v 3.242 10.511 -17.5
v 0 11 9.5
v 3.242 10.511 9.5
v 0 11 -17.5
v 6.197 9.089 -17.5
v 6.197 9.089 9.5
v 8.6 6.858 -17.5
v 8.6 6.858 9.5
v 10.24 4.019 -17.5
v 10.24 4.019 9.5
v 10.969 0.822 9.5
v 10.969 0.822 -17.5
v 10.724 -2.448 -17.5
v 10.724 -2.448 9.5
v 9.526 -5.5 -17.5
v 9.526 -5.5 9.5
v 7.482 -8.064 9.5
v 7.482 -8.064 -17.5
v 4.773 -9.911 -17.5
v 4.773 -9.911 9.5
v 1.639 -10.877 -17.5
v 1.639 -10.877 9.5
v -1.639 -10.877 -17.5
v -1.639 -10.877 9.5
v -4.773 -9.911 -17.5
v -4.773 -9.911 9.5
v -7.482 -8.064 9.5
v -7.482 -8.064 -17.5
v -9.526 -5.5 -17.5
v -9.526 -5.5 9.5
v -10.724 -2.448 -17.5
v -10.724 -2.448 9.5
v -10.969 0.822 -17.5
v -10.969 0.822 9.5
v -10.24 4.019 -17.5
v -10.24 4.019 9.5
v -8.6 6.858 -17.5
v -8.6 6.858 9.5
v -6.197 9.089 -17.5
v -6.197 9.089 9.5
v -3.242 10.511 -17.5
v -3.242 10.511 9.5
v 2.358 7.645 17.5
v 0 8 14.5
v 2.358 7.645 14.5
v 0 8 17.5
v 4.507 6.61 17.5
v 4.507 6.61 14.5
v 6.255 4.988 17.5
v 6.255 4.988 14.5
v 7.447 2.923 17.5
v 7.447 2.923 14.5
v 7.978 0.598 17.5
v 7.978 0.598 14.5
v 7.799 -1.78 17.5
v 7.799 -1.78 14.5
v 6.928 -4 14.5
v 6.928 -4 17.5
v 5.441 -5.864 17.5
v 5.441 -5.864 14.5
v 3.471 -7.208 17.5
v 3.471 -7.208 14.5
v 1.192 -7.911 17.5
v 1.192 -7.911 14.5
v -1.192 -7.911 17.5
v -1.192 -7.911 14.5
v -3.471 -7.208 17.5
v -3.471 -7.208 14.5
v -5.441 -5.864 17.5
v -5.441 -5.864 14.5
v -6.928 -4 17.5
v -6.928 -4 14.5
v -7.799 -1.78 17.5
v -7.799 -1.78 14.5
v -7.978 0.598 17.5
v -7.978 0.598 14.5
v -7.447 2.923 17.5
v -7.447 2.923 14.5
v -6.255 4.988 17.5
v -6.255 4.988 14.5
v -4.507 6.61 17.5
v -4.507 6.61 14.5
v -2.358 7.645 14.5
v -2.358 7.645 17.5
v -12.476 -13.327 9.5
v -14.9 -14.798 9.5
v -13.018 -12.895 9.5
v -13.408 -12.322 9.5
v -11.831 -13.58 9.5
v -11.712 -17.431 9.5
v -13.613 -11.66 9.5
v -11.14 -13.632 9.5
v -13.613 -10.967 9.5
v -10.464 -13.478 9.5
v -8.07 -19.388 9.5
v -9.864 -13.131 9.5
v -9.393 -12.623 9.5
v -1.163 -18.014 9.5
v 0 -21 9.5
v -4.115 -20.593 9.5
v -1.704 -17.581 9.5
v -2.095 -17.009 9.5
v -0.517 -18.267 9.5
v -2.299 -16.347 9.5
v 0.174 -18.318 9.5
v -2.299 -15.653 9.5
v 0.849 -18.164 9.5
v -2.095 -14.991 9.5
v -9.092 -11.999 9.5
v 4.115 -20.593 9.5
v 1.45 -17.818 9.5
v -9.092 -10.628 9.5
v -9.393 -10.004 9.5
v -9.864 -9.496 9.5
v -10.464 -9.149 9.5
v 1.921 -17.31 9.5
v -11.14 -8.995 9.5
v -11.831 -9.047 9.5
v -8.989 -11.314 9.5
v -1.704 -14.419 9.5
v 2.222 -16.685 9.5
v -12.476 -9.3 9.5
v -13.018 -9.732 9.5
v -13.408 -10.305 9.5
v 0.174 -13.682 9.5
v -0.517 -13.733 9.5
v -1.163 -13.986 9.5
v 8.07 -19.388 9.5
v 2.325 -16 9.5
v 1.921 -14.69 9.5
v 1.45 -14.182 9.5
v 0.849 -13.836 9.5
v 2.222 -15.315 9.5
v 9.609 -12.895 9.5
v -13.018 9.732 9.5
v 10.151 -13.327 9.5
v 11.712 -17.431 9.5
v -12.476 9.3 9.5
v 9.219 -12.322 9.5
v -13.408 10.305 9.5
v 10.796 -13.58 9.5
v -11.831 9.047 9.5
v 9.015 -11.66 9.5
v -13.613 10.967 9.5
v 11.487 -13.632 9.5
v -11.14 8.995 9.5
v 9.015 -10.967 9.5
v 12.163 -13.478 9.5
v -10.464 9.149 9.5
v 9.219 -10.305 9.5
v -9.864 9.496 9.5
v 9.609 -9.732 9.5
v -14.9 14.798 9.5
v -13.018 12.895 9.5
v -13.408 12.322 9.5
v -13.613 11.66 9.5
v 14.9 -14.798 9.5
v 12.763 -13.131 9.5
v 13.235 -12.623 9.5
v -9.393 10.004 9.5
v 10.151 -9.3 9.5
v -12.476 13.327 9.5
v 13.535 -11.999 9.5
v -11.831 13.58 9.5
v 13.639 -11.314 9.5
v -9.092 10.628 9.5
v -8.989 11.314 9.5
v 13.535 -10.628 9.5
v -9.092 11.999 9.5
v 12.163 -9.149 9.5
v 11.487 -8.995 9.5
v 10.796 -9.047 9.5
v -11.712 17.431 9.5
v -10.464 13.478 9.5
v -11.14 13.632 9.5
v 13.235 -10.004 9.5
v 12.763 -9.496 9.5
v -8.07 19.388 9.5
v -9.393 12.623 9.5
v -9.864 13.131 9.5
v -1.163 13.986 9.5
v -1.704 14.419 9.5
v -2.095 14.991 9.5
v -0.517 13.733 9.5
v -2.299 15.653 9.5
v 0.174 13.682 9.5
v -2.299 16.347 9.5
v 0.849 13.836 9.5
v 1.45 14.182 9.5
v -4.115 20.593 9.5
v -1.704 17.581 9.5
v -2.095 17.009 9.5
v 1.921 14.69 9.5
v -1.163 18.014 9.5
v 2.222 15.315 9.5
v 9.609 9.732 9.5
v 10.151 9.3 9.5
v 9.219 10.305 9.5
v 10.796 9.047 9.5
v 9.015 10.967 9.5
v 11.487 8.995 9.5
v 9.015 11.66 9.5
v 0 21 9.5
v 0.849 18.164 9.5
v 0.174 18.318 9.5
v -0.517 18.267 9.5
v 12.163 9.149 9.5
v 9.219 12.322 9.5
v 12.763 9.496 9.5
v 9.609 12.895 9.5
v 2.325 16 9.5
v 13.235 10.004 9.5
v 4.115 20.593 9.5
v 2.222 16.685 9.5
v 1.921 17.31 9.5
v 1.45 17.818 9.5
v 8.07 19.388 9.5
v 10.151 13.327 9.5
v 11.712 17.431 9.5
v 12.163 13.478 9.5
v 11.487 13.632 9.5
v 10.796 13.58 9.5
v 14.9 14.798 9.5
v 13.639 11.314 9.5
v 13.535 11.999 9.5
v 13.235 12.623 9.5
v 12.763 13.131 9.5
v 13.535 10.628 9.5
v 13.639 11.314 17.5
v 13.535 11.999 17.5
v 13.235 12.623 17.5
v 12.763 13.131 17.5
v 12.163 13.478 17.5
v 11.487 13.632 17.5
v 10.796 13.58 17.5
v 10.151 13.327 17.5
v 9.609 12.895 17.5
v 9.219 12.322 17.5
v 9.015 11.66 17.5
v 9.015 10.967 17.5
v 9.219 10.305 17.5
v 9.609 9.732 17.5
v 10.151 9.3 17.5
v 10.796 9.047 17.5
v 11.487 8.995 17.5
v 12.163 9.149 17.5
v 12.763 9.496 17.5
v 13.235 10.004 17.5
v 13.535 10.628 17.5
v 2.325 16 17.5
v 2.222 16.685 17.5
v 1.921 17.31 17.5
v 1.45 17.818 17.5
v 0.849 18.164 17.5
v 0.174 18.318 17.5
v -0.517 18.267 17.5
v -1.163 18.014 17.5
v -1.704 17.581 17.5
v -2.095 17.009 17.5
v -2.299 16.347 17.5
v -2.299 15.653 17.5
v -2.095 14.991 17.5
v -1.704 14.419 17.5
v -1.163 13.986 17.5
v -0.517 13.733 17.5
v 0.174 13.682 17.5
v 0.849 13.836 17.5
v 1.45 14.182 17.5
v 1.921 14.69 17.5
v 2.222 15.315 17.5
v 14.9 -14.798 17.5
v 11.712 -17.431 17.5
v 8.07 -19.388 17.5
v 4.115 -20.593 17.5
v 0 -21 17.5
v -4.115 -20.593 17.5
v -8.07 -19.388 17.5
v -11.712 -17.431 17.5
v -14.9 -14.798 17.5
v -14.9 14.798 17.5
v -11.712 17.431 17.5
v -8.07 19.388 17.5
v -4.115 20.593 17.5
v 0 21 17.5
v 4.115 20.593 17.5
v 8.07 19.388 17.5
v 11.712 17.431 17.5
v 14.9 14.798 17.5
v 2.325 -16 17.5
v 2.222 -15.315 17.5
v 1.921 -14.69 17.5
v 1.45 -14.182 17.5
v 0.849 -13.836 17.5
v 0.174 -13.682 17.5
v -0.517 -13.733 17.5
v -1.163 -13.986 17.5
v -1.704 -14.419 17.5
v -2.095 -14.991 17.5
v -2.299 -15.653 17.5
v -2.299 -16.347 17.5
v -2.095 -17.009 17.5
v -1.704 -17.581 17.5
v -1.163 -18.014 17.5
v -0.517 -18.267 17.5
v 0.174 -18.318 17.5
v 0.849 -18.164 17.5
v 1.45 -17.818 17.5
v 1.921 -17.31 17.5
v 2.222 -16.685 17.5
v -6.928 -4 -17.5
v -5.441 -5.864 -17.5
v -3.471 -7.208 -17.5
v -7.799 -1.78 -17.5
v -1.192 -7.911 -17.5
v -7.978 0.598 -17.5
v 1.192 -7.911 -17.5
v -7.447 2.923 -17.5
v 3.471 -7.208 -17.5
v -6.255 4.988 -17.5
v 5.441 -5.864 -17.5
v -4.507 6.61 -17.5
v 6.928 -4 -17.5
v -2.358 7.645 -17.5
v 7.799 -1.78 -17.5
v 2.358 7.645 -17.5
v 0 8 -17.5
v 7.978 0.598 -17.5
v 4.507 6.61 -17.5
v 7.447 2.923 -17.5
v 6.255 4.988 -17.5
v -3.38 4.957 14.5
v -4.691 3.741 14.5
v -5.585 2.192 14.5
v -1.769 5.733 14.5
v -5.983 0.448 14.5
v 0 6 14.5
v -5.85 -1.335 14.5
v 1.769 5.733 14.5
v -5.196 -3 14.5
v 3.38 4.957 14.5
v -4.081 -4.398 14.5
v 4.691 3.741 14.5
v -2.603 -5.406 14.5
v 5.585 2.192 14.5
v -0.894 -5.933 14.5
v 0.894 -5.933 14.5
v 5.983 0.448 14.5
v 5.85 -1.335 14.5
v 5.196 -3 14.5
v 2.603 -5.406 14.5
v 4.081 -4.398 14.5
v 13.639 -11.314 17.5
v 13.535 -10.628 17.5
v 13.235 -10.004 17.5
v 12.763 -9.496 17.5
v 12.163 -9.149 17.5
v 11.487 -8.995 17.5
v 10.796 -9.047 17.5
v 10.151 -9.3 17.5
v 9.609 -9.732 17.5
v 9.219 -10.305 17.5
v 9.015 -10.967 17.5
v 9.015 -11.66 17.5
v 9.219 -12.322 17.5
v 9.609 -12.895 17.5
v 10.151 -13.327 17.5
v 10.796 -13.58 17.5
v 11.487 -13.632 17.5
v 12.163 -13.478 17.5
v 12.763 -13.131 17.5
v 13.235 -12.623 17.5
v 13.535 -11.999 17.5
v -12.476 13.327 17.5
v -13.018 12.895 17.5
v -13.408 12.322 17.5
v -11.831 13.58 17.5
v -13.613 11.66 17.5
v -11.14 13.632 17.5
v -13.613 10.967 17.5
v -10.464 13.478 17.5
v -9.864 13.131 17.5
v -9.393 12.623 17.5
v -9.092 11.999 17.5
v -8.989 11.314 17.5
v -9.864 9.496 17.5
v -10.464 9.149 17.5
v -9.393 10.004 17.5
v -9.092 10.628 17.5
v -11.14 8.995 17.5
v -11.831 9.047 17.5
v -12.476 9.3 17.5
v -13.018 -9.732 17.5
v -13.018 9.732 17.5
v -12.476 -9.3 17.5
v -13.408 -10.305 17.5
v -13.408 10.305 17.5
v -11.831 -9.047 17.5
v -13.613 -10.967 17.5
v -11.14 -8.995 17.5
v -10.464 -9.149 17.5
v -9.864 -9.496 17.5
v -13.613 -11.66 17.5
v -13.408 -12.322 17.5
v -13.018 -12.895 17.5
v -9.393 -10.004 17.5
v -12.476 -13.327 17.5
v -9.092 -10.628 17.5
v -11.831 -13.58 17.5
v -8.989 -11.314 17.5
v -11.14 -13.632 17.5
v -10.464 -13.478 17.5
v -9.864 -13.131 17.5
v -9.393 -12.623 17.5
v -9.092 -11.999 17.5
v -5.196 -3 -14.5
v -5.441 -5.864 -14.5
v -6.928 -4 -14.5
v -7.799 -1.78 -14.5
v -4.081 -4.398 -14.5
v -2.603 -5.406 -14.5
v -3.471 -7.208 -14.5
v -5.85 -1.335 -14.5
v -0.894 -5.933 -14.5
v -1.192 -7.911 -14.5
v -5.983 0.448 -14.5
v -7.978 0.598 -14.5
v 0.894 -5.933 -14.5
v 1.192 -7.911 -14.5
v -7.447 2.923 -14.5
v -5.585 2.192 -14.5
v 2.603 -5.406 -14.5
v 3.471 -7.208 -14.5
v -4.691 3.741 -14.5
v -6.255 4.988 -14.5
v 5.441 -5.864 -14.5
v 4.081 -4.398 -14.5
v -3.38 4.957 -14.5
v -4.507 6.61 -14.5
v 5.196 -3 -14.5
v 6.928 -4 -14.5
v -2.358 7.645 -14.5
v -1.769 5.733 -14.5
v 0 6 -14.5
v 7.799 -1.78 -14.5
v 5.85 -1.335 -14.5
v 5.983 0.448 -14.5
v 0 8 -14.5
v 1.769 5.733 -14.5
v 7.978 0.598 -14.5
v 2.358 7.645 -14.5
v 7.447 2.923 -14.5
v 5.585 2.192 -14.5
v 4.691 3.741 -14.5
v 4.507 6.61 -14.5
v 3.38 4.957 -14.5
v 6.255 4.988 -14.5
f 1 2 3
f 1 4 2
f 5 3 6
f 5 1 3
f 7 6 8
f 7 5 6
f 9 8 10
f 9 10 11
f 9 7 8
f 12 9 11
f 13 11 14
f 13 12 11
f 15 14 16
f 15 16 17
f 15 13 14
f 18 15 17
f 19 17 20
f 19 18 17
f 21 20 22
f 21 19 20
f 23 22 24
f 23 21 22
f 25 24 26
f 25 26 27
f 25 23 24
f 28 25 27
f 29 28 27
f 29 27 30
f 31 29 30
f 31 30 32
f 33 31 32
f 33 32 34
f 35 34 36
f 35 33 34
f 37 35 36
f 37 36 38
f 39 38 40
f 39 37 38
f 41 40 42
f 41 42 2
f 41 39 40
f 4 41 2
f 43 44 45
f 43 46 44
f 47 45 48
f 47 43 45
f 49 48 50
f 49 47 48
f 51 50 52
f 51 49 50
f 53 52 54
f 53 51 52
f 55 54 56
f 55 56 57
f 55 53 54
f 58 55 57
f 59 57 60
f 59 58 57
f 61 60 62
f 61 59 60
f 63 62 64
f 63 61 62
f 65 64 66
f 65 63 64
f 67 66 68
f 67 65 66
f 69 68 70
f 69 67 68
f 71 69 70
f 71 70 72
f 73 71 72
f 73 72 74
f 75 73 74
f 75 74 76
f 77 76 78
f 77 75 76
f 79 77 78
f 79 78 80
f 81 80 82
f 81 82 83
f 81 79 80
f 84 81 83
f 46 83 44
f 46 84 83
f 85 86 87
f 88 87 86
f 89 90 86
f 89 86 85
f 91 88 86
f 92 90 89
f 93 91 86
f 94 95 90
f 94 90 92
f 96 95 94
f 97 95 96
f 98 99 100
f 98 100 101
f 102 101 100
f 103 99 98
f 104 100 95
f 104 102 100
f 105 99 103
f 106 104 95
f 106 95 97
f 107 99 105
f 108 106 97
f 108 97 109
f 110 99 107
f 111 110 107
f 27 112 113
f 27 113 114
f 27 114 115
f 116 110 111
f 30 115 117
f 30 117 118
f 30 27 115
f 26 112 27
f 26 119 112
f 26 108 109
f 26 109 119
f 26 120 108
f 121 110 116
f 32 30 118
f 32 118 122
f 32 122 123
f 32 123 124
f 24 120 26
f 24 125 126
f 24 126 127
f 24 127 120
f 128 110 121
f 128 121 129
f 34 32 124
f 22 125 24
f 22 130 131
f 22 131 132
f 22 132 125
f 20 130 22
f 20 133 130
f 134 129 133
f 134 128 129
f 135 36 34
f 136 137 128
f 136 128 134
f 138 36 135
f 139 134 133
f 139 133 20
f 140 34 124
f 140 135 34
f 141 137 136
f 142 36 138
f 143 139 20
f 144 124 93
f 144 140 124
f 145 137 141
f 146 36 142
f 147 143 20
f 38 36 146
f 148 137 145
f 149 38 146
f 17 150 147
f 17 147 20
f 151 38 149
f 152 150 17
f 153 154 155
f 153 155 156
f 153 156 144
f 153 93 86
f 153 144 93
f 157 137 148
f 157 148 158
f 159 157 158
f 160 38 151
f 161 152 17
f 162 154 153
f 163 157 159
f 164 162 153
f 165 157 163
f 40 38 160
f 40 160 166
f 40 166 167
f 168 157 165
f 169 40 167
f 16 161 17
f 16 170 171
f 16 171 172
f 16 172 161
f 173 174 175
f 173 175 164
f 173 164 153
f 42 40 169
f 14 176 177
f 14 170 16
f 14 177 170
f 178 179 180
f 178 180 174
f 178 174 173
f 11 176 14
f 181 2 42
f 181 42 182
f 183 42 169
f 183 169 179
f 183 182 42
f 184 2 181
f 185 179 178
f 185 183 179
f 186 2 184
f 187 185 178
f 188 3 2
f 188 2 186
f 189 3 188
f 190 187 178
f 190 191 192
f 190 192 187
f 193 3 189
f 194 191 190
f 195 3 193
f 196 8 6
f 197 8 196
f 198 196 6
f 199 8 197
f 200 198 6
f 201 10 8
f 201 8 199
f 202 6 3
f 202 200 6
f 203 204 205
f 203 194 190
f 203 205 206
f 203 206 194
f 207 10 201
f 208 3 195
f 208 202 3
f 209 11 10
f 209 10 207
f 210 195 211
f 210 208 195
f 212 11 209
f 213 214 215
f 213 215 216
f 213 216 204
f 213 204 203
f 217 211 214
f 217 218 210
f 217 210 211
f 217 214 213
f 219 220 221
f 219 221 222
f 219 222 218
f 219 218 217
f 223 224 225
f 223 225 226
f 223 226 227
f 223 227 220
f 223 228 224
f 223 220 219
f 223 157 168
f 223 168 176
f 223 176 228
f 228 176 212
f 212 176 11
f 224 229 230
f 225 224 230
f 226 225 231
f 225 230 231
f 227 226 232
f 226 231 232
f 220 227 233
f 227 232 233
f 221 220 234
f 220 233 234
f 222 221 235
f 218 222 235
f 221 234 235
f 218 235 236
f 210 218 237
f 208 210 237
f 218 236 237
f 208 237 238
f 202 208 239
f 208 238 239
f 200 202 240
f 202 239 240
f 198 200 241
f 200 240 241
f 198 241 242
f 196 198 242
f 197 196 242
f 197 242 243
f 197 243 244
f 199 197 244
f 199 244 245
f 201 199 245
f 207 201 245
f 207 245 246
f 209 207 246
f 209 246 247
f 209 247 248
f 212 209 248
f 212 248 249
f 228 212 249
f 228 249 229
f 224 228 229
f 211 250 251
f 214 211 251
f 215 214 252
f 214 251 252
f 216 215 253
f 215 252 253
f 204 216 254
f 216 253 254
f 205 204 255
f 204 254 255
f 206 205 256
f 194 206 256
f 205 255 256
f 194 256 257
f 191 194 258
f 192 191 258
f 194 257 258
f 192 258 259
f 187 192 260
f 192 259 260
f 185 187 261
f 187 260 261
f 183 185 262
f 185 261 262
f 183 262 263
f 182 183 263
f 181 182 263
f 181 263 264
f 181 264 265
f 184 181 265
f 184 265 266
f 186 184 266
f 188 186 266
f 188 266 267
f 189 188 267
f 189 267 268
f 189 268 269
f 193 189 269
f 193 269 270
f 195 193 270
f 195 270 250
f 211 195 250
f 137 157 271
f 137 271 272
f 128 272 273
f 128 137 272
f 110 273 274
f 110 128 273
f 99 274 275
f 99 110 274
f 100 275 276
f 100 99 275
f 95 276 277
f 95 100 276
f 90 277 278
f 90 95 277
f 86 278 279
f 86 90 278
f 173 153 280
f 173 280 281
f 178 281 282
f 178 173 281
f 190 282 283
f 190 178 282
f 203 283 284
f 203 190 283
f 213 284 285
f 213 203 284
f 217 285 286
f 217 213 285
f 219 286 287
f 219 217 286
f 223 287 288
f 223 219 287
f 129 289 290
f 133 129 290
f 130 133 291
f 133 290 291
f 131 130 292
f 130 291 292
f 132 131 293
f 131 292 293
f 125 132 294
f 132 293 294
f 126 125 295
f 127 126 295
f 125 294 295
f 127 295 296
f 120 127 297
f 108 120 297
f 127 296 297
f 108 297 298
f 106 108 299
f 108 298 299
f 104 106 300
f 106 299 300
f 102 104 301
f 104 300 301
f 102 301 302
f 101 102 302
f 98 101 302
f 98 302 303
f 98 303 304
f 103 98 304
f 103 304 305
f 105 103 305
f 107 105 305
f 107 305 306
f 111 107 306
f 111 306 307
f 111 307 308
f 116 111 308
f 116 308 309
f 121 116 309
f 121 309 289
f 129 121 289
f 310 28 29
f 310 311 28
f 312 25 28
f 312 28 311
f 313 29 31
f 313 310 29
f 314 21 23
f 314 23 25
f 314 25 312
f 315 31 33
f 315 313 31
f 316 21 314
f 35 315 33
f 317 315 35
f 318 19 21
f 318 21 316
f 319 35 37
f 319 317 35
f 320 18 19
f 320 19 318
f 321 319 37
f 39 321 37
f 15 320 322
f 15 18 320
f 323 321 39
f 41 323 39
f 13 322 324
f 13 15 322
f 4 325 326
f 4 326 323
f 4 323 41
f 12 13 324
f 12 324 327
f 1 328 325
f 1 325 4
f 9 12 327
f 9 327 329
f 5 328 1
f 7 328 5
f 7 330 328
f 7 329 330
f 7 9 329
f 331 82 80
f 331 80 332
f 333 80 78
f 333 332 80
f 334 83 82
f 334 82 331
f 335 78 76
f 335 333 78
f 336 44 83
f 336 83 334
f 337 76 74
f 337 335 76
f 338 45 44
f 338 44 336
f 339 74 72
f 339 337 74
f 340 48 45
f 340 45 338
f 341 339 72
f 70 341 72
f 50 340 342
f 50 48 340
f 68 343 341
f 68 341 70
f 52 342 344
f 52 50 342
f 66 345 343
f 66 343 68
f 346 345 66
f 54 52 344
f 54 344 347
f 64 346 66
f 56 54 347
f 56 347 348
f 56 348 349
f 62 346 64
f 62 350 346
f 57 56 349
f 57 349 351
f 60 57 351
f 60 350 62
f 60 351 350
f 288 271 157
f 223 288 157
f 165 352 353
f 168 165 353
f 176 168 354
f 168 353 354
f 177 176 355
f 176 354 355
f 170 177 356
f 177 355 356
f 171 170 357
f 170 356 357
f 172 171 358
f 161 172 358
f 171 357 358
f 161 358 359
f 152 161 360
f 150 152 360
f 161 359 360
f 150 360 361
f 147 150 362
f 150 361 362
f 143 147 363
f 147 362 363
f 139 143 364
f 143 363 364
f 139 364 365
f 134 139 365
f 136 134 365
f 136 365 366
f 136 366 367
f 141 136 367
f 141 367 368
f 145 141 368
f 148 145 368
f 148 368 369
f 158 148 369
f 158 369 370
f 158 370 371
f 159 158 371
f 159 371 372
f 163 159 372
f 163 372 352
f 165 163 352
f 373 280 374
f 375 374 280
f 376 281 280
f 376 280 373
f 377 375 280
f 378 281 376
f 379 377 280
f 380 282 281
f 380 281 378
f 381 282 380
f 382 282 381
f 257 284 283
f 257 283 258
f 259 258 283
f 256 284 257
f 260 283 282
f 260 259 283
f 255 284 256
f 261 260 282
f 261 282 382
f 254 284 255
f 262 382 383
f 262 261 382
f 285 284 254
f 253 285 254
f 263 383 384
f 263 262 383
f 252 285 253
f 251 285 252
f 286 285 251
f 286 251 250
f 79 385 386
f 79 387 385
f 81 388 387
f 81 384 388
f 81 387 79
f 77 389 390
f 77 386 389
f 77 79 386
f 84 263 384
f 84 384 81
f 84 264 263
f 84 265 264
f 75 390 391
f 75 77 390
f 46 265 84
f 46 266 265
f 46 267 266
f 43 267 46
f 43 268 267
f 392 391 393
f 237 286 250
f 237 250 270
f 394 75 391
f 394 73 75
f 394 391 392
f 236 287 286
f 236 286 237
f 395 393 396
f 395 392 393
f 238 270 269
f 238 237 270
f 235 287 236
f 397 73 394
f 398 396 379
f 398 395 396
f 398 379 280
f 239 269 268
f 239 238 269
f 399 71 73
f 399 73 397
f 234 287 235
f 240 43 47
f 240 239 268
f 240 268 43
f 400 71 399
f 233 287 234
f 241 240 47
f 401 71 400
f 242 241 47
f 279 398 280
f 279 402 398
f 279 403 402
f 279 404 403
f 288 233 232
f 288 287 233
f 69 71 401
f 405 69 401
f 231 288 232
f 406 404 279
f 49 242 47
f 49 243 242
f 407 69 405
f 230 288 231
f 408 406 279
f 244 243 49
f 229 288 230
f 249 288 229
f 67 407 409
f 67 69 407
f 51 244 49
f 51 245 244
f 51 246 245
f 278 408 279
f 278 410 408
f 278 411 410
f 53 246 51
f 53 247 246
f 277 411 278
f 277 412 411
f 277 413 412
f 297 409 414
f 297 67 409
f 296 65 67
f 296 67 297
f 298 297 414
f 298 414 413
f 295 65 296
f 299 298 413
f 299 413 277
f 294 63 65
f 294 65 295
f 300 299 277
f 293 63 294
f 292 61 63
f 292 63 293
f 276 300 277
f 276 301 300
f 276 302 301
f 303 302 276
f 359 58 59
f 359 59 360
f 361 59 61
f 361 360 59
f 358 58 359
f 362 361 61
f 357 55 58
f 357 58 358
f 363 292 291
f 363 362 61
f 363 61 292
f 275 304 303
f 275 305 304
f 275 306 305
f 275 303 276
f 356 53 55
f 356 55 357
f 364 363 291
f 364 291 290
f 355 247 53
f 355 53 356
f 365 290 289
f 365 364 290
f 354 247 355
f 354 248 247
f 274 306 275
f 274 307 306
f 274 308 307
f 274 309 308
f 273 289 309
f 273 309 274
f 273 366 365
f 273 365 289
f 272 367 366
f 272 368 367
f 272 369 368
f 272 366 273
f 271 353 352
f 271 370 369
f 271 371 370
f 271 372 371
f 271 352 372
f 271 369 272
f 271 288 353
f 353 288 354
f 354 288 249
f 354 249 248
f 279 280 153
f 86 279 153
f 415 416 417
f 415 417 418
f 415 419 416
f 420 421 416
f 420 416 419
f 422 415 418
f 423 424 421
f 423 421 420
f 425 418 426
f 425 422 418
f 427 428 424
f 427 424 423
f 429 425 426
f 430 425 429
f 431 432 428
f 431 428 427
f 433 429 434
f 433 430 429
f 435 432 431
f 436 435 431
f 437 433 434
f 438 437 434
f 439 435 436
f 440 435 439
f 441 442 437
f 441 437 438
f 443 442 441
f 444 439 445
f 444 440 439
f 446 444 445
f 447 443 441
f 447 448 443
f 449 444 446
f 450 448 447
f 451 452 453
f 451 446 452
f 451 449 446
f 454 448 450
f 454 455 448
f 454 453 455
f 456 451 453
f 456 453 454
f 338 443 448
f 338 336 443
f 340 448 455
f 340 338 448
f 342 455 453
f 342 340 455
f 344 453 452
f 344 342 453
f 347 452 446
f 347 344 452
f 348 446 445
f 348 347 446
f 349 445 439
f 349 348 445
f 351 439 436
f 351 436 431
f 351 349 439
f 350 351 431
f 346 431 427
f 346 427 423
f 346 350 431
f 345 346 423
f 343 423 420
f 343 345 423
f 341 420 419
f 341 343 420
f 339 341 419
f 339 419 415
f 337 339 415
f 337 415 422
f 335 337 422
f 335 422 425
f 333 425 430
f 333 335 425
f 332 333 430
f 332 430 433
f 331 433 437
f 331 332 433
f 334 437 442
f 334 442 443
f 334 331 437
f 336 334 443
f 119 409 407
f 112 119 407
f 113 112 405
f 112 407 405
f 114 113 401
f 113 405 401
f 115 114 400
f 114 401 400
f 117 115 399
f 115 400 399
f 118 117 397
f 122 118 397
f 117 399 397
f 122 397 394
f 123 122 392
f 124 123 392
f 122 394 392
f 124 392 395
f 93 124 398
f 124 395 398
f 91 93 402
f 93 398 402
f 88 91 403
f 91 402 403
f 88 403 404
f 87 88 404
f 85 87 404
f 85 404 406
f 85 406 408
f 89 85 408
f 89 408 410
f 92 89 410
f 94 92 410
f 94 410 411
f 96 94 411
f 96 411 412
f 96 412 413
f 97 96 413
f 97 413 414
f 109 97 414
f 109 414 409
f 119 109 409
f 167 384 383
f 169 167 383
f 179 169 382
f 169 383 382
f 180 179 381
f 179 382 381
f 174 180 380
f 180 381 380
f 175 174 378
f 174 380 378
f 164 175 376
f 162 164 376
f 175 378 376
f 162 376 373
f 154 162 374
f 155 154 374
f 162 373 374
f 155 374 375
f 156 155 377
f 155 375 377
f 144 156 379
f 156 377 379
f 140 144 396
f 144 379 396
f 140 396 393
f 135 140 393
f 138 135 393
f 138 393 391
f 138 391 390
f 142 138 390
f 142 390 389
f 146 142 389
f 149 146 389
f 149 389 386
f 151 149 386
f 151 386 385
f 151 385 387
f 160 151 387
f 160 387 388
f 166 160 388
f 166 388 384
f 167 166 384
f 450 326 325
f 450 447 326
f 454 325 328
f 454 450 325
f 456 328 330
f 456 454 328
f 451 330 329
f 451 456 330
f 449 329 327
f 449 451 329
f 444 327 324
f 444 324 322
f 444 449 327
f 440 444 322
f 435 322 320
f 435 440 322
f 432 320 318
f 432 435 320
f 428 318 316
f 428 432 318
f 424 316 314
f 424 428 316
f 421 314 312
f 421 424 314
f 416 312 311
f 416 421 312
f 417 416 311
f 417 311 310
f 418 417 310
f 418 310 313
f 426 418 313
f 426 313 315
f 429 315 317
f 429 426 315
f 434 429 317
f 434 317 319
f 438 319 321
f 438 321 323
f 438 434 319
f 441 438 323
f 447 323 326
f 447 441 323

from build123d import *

# Parameters (mm, degrees)
SKETCH2_W               = 6.1
SKETCH2_H               = 8
CUT_EXTRUDE1_DEPTH      = 22
CUT_EXTRUDE1_DEPTH_BACK = 22
SKETCH3_R               = 2.325
CUT_EXTRUDE2_DEPTH      = 10


with BuildPart() as part:
    # Sketch1 → Revolve1 (revolve)
    with BuildSketch(Plane(origin=(0, 0, 0), x_dir=(0, 0, -1), z_dir=(1, 0, 0))):
        Polygon((14.5, 6), (-14.5, 6), (-14.5, 8), (-17.5, 8), (-17.5, 21), (-9.5, 21), (-9.5, 11), (17.5, 11), (17.5, 8), (14.5, 8), align=None)
    revolve(axis=Axis((0, 0, 27), (0, 0, -1)))

    # Sketch2 → Cut-Extrude1 (cut, two sides)
    with BuildSketch(Plane(origin=(0, 0, 0), x_dir=(1, 0, 0), z_dir=(0, 1, 0))) as cut_extrude1_sk:
        with Locations((-17.95, -13.5)):
            Rectangle(SKETCH2_W, SKETCH2_H)
        with Locations((17.95, -13.5)):
            Rectangle(SKETCH2_W, SKETCH2_H)
    extrude(amount=CUT_EXTRUDE1_DEPTH, mode=Mode.SUBTRACT)
    extrude(cut_extrude1_sk.sketch, amount=-CUT_EXTRUDE1_DEPTH_BACK, mode=Mode.SUBTRACT)

    # Sketch3 → Cut-Extrude2 (cut)
    with BuildSketch(Plane.XY.offset(17.5)):
        with Locations((0, 16)):
            Circle(SKETCH3_R)
        with Locations((11.313708499, 11.313708499)):
            Circle(SKETCH3_R)
        with Locations((11.313708499, -11.313708499)):
            Circle(SKETCH3_R)
        with Locations((0, -16)):
            Circle(SKETCH3_R)
        with Locations((-11.313708499, -11.313708499)):
            Circle(SKETCH3_R)
        with Locations((-11.313708499, 11.313708499)):
            Circle(SKETCH3_R)
    extrude(amount=-CUT_EXTRUDE2_DEPTH, mode=Mode.SUBTRACT)


solid = part.part
